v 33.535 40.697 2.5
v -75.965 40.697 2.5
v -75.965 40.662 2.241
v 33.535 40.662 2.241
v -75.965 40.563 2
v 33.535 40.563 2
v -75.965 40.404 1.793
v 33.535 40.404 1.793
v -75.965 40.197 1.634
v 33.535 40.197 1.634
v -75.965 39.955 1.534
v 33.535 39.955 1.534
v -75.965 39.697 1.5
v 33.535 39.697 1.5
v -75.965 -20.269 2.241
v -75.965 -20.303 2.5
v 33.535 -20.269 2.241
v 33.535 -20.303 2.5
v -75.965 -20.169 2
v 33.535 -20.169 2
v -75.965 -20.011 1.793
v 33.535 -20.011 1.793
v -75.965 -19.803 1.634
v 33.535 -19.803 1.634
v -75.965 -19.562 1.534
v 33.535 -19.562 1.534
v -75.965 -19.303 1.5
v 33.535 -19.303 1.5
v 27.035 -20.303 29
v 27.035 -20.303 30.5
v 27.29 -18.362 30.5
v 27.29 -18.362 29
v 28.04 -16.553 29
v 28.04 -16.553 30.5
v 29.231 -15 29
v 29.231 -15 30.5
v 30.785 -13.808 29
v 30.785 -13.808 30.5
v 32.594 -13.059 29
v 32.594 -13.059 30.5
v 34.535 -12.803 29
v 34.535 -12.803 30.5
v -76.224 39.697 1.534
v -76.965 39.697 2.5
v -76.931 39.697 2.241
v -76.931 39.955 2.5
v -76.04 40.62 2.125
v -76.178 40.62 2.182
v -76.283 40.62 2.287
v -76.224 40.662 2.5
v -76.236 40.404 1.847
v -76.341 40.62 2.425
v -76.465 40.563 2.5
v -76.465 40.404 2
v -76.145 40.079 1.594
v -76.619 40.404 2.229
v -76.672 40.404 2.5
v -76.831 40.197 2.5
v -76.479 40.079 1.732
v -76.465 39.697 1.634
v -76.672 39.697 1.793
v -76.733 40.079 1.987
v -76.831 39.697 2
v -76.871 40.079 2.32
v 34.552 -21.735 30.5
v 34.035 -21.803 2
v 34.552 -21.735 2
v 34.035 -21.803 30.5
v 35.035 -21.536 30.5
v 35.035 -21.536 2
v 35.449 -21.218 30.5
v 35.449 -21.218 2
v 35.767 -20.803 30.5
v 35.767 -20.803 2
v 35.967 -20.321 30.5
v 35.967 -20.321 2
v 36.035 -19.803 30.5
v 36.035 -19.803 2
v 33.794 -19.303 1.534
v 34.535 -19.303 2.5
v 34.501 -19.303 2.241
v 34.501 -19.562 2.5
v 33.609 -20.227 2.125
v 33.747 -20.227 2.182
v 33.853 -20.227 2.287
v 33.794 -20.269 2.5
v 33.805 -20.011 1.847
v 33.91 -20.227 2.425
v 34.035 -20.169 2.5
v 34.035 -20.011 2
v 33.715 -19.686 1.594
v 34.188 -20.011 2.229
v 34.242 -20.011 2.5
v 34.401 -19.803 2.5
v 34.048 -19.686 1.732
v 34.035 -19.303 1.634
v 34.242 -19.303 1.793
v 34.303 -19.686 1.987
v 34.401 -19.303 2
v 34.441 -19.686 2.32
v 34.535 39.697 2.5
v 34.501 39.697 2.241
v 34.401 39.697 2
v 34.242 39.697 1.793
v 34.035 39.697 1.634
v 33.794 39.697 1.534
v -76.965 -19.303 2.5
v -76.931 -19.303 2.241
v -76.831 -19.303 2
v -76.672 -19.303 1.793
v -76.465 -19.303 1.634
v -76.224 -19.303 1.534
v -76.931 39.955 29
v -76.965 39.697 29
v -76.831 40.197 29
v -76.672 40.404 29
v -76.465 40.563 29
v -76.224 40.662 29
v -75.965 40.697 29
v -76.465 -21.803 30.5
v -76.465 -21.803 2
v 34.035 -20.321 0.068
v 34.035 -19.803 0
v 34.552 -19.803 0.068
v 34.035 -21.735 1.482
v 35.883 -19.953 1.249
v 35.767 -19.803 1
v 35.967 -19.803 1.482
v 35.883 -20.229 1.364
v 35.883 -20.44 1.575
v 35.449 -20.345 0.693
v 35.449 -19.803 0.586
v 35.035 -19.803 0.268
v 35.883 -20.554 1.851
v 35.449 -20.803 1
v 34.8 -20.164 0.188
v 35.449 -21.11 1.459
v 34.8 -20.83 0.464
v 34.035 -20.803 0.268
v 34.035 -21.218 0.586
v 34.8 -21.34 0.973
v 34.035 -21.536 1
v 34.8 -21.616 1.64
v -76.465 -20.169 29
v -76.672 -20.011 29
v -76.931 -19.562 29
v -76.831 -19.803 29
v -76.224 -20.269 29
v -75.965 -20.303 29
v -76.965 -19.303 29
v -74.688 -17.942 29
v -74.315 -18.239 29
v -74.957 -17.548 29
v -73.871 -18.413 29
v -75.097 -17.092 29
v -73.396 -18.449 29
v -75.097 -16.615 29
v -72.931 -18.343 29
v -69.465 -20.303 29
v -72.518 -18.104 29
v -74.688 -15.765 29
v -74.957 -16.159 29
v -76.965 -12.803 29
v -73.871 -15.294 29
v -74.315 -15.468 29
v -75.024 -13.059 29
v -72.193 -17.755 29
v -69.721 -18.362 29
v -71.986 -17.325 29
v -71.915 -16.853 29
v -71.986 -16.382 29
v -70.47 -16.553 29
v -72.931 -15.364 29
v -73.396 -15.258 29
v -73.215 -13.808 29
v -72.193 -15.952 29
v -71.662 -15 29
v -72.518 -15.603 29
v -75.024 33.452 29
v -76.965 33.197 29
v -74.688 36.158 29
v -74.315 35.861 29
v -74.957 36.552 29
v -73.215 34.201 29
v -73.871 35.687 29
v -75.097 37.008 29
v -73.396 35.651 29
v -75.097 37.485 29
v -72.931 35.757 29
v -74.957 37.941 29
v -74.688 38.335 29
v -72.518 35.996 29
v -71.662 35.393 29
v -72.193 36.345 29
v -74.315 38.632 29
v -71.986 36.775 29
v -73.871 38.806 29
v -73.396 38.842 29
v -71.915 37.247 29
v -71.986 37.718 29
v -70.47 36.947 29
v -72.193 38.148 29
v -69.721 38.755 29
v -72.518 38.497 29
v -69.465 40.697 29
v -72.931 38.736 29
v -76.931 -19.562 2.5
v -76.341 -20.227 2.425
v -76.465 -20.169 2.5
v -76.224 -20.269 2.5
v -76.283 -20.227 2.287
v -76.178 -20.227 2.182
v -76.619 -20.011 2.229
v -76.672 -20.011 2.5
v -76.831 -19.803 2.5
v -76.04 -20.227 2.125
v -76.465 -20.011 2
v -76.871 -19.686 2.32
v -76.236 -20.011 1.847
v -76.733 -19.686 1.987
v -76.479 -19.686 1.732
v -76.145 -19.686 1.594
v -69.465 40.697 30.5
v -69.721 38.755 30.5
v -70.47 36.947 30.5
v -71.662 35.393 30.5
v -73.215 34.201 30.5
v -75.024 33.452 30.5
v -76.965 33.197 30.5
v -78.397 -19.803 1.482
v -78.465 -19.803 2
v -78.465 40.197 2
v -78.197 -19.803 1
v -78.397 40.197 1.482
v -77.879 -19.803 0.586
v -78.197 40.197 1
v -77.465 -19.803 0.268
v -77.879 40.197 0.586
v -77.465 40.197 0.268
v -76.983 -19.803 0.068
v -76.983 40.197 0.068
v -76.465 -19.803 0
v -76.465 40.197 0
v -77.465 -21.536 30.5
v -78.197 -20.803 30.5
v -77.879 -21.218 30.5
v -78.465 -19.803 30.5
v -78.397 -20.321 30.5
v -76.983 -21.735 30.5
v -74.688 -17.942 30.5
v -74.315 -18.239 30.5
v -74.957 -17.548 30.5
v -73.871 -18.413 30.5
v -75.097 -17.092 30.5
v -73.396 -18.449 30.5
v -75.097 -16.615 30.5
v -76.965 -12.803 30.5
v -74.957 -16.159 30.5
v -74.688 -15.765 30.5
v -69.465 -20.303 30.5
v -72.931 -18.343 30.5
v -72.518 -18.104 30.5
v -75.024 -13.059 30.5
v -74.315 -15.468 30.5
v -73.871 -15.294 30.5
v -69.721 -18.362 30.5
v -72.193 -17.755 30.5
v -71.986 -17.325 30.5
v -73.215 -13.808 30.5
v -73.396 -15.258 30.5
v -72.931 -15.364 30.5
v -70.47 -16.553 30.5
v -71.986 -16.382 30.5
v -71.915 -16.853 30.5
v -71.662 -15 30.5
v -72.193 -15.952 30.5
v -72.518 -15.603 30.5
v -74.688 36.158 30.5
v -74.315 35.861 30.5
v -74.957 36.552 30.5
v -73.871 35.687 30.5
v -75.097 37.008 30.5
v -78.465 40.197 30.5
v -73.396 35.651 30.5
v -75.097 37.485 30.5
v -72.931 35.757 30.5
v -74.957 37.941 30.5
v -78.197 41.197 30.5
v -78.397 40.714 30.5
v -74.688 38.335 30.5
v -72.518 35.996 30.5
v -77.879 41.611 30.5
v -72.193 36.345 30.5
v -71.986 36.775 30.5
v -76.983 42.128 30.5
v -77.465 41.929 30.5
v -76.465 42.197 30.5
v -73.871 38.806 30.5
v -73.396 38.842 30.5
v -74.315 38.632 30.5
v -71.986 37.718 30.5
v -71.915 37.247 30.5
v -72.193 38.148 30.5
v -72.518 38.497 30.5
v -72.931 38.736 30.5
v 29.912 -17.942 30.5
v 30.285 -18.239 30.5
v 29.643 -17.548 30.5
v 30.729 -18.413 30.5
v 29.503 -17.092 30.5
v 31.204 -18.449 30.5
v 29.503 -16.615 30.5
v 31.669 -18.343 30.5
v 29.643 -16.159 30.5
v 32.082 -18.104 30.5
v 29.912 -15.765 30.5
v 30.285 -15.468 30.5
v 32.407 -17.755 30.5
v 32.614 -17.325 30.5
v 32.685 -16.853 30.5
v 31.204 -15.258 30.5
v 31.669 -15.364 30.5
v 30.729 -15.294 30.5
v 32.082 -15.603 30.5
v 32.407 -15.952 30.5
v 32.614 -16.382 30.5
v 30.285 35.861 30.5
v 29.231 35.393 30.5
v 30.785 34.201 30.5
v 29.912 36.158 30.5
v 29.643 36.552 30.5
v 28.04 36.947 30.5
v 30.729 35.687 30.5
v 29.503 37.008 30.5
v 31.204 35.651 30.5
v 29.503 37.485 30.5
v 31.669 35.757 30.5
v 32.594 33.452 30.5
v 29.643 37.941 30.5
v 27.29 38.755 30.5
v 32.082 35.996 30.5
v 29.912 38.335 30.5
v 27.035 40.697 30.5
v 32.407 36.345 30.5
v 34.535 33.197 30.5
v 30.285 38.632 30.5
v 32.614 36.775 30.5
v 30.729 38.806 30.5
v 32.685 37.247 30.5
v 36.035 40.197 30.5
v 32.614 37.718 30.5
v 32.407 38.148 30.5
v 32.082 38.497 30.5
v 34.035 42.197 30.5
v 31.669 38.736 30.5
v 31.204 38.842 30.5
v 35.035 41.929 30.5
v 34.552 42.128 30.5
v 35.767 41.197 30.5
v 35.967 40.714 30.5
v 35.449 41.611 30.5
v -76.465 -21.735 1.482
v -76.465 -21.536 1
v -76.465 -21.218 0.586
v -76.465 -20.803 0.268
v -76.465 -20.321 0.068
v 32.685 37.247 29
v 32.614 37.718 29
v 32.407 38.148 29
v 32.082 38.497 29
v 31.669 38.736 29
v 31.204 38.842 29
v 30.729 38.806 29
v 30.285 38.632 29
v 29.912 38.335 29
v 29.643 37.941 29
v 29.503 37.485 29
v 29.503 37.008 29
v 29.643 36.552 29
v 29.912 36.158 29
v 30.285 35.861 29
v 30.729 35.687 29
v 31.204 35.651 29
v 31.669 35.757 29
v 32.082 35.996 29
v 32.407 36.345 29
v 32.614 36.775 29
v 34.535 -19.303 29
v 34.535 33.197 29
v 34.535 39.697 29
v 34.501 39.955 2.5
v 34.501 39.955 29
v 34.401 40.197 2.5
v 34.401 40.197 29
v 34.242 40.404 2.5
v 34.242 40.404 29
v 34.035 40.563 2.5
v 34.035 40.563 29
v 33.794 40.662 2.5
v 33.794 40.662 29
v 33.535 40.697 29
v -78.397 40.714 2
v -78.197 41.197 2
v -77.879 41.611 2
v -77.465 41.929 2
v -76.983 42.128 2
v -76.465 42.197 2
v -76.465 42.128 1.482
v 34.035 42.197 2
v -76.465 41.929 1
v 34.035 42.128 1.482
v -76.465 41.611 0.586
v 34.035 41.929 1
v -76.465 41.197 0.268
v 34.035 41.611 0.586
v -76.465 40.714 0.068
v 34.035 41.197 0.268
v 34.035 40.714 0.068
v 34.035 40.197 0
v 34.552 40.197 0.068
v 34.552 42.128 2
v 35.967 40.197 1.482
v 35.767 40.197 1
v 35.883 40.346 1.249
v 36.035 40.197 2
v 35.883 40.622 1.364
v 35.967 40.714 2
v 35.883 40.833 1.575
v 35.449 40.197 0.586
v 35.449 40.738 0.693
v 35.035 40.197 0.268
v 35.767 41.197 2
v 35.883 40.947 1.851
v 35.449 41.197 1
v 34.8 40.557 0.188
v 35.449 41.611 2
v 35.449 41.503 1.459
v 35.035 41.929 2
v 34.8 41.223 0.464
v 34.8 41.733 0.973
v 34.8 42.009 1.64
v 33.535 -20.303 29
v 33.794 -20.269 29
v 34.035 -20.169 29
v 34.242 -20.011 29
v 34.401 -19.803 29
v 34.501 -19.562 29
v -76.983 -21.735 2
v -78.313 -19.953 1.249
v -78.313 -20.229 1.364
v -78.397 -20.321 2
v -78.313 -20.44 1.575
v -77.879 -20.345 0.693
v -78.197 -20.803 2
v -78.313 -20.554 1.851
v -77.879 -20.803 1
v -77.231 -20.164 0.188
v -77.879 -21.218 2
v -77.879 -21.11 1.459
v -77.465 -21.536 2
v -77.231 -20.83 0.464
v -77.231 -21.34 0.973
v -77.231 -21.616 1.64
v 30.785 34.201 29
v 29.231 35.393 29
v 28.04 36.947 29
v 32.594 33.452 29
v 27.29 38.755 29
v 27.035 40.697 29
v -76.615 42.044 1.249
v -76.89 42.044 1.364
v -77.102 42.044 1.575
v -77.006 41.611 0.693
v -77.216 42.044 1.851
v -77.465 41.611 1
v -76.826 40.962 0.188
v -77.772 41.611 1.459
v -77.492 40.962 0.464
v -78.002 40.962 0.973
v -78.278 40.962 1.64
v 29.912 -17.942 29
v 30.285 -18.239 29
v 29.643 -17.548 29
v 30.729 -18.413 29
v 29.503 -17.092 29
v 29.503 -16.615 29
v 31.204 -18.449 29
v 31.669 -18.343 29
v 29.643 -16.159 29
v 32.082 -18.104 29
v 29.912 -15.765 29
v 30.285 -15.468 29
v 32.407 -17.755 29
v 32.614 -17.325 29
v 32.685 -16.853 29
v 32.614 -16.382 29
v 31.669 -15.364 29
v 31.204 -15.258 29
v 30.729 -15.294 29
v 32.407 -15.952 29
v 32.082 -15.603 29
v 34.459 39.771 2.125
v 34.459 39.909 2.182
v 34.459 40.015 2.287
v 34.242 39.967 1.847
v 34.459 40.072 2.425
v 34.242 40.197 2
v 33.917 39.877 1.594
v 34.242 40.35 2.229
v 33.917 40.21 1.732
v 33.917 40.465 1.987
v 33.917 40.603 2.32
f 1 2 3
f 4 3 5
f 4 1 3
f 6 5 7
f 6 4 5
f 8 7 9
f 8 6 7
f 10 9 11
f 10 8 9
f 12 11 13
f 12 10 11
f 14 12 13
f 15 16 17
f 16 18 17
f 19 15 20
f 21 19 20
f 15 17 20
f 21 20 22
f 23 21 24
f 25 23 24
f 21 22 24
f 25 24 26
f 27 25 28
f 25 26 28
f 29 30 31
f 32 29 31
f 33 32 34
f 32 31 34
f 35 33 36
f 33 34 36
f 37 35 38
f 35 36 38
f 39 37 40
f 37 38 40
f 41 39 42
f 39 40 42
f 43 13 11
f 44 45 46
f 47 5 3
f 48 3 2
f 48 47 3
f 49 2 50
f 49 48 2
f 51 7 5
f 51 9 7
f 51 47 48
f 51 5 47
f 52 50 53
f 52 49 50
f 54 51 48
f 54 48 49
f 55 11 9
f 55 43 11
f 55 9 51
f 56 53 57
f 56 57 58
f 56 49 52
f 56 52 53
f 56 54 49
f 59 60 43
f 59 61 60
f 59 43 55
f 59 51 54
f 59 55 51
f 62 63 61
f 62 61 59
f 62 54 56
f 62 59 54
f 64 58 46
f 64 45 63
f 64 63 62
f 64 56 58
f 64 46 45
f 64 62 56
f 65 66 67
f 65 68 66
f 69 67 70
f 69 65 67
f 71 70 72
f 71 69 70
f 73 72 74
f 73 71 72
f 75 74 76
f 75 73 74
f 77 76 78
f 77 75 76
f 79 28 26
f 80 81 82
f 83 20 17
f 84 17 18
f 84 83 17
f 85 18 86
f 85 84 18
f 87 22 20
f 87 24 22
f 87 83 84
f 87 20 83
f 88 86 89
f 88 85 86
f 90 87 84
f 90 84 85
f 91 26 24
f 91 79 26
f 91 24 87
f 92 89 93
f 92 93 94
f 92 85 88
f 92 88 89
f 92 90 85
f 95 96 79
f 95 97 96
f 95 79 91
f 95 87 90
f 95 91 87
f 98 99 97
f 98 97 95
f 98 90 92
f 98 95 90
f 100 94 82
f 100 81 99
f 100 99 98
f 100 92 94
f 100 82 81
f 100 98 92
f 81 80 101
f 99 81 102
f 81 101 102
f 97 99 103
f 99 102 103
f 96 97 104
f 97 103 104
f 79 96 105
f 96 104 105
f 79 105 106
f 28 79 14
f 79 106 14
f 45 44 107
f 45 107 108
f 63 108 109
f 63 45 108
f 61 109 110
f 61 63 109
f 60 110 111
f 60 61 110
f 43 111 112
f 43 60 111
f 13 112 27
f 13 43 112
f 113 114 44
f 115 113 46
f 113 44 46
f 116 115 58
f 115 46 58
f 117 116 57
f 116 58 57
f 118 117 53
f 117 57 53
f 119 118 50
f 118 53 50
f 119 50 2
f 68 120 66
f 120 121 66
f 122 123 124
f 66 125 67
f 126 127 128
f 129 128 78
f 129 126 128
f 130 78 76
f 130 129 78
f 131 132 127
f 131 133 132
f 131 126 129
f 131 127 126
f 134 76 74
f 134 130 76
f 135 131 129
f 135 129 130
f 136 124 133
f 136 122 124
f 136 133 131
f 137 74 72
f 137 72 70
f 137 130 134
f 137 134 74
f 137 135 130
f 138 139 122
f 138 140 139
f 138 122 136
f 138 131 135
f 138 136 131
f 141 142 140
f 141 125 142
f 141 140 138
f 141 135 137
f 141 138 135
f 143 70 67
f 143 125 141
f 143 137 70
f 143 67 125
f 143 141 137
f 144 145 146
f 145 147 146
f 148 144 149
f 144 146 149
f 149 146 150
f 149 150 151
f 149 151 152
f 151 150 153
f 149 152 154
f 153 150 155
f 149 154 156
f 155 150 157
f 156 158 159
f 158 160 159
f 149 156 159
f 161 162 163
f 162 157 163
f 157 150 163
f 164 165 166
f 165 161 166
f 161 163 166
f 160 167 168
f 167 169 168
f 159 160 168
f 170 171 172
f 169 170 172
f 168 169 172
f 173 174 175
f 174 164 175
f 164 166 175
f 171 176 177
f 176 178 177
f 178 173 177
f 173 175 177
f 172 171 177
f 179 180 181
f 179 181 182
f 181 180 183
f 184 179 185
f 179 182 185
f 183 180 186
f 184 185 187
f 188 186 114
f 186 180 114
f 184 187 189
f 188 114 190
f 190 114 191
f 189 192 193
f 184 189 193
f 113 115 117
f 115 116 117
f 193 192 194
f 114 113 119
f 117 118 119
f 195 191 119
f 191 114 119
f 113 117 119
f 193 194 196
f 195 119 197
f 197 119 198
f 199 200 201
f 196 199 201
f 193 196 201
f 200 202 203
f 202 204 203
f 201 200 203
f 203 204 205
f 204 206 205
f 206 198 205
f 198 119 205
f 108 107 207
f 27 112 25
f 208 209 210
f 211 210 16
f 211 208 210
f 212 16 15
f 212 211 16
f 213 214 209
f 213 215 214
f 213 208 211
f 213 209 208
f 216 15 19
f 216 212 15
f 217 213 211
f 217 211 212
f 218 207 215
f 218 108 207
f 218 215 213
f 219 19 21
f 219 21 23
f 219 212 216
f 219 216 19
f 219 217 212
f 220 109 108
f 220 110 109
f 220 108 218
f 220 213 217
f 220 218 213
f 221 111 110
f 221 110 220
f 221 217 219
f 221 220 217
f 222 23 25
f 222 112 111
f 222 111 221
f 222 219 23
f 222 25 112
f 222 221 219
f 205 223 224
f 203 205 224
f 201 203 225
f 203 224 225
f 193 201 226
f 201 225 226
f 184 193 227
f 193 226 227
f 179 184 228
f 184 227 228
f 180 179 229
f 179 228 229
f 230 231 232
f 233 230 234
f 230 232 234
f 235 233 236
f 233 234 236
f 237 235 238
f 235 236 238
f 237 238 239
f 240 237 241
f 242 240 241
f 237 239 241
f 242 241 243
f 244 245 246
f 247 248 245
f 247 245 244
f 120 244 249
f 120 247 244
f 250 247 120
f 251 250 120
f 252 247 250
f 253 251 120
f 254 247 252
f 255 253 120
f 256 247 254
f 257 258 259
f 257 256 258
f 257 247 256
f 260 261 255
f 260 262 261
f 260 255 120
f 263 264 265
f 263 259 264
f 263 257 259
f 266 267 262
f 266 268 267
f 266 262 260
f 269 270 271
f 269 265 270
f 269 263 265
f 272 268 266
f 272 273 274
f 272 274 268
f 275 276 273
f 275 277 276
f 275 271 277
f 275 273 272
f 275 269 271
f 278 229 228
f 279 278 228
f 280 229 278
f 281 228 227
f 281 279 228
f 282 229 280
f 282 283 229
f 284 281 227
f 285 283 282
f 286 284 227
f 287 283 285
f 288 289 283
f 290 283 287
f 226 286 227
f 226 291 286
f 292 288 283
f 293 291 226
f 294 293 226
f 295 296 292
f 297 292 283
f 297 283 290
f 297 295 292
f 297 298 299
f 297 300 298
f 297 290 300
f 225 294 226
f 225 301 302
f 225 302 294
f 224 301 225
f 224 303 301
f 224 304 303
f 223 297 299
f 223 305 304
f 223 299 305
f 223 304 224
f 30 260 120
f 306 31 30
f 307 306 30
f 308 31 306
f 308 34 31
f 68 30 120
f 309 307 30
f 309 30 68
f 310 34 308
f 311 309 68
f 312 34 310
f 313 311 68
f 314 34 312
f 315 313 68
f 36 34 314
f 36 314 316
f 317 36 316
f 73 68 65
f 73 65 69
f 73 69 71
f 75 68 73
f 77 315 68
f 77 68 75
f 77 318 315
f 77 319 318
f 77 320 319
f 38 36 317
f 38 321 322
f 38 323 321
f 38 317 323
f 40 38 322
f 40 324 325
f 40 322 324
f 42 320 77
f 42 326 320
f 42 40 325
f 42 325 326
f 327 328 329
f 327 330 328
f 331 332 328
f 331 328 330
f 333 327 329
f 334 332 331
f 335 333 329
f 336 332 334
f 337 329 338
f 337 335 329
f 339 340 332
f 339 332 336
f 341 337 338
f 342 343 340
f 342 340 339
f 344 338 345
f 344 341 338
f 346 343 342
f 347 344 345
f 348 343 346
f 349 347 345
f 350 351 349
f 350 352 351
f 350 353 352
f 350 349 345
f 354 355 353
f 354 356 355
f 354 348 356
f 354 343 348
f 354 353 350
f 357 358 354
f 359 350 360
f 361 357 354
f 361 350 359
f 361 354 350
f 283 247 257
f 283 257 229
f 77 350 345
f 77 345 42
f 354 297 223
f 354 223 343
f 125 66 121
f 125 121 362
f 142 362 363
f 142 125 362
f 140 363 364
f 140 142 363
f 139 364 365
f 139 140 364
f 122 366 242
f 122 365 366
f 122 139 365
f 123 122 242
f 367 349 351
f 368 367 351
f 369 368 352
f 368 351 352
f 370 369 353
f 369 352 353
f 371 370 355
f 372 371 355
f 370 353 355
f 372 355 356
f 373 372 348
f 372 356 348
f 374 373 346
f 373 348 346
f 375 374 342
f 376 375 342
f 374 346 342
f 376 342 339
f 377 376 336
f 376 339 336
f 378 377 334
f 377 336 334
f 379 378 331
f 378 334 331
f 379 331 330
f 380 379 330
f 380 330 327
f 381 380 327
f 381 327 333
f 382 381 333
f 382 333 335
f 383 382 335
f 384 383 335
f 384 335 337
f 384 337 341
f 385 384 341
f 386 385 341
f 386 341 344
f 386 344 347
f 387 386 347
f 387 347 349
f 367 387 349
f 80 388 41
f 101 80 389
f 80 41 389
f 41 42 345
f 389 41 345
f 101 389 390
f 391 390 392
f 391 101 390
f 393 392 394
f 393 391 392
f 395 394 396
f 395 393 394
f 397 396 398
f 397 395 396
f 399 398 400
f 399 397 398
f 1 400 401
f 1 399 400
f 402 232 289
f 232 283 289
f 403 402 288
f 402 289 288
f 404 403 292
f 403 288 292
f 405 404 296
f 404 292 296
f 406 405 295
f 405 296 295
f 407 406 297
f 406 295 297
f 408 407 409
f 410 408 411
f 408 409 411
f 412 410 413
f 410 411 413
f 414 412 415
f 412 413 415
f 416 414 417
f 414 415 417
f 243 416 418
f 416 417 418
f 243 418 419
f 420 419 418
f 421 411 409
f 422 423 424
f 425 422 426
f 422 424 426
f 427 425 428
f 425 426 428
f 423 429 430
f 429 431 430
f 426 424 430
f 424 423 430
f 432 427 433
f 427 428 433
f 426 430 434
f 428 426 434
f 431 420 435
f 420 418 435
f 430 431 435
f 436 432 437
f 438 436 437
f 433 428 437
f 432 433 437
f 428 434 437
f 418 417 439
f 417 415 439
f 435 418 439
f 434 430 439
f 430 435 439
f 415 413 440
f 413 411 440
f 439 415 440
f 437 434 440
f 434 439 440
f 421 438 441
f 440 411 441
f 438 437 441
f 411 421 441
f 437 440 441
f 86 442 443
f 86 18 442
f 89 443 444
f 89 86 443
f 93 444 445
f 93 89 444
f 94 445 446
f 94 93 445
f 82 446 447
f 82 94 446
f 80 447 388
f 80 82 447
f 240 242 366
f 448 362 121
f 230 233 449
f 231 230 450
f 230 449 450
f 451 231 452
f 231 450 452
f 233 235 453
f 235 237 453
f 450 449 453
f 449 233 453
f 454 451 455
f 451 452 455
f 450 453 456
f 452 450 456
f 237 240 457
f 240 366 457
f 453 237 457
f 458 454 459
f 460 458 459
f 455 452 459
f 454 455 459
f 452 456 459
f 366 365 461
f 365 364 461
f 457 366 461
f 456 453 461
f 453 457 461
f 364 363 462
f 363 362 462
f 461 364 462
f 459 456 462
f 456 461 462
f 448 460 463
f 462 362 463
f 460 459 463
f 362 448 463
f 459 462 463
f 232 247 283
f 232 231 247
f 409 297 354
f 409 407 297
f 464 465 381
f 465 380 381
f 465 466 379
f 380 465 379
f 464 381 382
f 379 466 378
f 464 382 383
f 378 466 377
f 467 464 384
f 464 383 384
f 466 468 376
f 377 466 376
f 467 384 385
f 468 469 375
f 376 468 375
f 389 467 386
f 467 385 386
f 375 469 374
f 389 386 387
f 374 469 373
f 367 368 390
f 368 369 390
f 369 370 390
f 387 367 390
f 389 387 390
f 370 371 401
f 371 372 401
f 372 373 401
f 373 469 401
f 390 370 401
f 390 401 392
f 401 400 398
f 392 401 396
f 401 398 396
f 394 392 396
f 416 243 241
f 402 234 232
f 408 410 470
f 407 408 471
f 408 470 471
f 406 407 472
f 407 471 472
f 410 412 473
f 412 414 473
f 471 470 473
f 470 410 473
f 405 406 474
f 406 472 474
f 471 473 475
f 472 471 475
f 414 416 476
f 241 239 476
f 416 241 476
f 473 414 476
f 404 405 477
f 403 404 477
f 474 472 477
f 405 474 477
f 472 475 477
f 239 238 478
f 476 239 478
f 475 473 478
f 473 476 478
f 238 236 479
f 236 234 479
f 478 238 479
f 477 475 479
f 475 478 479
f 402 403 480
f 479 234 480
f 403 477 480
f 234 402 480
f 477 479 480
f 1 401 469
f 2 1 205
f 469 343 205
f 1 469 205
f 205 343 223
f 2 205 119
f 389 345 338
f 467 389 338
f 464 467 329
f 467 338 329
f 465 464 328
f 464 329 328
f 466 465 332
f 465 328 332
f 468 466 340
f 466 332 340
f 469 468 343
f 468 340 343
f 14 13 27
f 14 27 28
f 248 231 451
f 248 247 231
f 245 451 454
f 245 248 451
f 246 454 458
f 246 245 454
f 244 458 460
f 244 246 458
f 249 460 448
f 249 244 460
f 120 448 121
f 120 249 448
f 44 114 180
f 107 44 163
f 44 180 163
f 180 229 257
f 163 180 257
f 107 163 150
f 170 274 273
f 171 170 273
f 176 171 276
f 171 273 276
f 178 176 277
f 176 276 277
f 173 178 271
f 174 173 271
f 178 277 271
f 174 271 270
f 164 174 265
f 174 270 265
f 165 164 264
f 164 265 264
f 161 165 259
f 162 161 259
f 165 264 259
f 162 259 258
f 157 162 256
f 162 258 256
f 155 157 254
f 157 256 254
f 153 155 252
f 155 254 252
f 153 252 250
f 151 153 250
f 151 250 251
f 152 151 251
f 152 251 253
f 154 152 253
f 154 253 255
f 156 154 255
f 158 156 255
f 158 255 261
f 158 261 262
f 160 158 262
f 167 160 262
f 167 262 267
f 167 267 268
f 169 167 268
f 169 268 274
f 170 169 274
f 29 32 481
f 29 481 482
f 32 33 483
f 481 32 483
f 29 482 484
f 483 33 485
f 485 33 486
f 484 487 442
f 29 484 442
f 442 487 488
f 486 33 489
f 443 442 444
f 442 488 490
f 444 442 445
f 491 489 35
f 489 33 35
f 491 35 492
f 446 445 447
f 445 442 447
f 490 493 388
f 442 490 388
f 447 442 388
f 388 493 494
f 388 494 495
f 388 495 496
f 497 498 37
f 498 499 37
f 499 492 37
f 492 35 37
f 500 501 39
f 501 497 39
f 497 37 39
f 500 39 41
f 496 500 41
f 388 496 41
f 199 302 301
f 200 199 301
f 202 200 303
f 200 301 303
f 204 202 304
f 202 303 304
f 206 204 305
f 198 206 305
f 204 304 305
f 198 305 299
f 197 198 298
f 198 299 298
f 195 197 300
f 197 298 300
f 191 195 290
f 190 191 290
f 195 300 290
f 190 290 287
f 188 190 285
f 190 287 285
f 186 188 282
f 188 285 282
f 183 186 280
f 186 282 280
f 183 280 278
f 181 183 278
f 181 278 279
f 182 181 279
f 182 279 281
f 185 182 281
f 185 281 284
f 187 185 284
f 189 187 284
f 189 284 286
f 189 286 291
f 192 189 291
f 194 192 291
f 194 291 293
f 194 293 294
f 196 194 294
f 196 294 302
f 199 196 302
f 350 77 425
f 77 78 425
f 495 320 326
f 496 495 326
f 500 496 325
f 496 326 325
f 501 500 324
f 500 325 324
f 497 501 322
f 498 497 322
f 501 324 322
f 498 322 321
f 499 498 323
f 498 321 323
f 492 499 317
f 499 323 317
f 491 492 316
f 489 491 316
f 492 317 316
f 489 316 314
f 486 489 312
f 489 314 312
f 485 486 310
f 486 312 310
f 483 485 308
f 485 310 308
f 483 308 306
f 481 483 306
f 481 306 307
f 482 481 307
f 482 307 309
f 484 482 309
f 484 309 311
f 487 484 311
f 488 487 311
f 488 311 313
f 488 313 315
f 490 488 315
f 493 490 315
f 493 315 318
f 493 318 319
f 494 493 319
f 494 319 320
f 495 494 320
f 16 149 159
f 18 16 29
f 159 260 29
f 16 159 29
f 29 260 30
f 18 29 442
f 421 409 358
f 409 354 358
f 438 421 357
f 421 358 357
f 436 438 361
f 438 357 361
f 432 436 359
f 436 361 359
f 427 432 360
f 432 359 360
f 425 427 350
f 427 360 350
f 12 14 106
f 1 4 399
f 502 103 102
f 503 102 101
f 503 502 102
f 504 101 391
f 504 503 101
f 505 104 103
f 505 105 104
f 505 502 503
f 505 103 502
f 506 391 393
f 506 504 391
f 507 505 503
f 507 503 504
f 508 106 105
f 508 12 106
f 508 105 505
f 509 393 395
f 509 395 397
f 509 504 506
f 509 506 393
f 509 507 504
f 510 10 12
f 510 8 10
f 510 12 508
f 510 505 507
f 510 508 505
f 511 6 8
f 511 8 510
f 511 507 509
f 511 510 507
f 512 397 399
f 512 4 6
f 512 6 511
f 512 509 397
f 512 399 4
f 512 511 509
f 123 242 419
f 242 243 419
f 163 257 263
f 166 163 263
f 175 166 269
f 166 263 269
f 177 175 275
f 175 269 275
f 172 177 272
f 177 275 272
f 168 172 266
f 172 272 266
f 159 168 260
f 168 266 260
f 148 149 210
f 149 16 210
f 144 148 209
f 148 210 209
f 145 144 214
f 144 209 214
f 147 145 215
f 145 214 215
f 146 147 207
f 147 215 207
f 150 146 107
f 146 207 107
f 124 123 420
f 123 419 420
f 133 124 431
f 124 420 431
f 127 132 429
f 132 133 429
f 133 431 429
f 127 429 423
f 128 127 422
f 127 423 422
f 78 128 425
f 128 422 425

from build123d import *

# Parameters (mm, degrees)
ESQUISSE1_W             = 114.5
ESQUISSE1_H             = 64
BOSS_EXTRU_1_DEPTH      = 30.5
ENL_V_MAT_EXTRU_2_DEPTH = 1.5
ESQUISSE3_W             = 111.5
ESQUISSE3_H             = 61
ENL_V_MAT_EXTRU_3_DEPTH = 27.5
ENL_V_MAT_EXTRU_4_REACH = 96.168
ESQUISSE2_4_R           = 1.6
CONG_1_R                = 2
CONG_2_R                = 1


with BuildPart() as part:
    # Esquisse1 → Boss.-Extru.1 (new body)
    with BuildSketch(Plane.XY):
        with Locations((-21.215258856, 10.196525886)):
            Rectangle(ESQUISSE1_W, ESQUISSE1_H)
    extrude(amount=BOSS_EXTRU_1_DEPTH)

    # Esquisse2 → Enlèv. mat.-Extru.2 (cut)
    with BuildSketch(Plane.XY.offset(30.5)):
        with BuildLine():
            ThreePointArc((27.034741144, -20.303474114), (29.231440286, -15.000173256), (34.534741144, -12.803474114))
            Line((34.534741144, -12.803474114), (34.534741144, 33.196525886))
            ThreePointArc((34.534741144, 33.196525886), (29.231440286, 35.393225027), (27.034741144, 40.696525886))
            Line((27.034741144, 40.696525886), (-69.465258856, 40.696525886))
            ThreePointArc((-69.465258856, 40.696525886), (-71.661957997, 35.393225027), (-76.965258856, 33.196525886))
            Line((-76.965258856, 33.196525886), (-76.965258856, -12.803474114))
            ThreePointArc((-76.965258856, -12.803474114), (-71.661957997, -15.000173256), (-69.465258856, -20.303474114))
            Line((-69.465258856, -20.303474114), (27.034741144, -20.303474114))
        make_face()
    extrude(amount=-ENL_V_MAT_EXTRU_2_DEPTH, mode=Mode.SUBTRACT)

    # Esquisse3 → Enlèv. mat.-Extru.3 (cut)
    with BuildSketch(Plane.XY.offset(29)):
        with Locations((-21.215258856, 10.196525886)):
            Rectangle(ESQUISSE3_W, ESQUISSE3_H)
    extrude(amount=-ENL_V_MAT_EXTRU_3_DEPTH, mode=Mode.SUBTRACT)

    # Esquisse2<4> → Enlèv. mat.-Extru.4 (cut, up to next)
    with BuildSketch(Plane.XY.offset(30.5), mode=Mode.PRIVATE) as enl_v_mat_extru_4_sk1:
        with Locations((-73.515258856, 37.246525886)):
            Circle(ESQUISSE2_4_R)
    enl_v_mat_extru_4_tool1 = extrude(enl_v_mat_extru_4_sk1.sketch, amount=-ENL_V_MAT_EXTRU_4_REACH, mode=Mode.PRIVATE) & part.part
    # Esquisse2<4> → Enlèv. mat.-Extru.4 (cut, up to next)
    with BuildSketch(Plane.XY.offset(30.5), mode=Mode.PRIVATE) as enl_v_mat_extru_4_sk2:
        with Locations((31.084741144, 37.246525886)):
            Circle(ESQUISSE2_4_R)
    enl_v_mat_extru_4_tool2 = extrude(enl_v_mat_extru_4_sk2.sketch, amount=-ENL_V_MAT_EXTRU_4_REACH, mode=Mode.PRIVATE) & part.part
    # Esquisse2<4> → Enlèv. mat.-Extru.4 (cut, up to next)
    with BuildSketch(Plane.XY.offset(30.5), mode=Mode.PRIVATE) as enl_v_mat_extru_4_sk3:
        with Locations((-73.515258856, -16.853474114)):
            Circle(ESQUISSE2_4_R)
    enl_v_mat_extru_4_tool3 = extrude(enl_v_mat_extru_4_sk3.sketch, amount=-ENL_V_MAT_EXTRU_4_REACH, mode=Mode.PRIVATE) & part.part
    # Esquisse2<4> → Enlèv. mat.-Extru.4 (cut, up to next)
    with BuildSketch(Plane.XY.offset(30.5), mode=Mode.PRIVATE) as enl_v_mat_extru_4_sk4:
        with Locations((31.084741144, -16.853474114)):
            Circle(ESQUISSE2_4_R)
    enl_v_mat_extru_4_tool4 = extrude(enl_v_mat_extru_4_sk4.sketch, amount=-ENL_V_MAT_EXTRU_4_REACH, mode=Mode.PRIVATE) & part.part
    add(enl_v_mat_extru_4_tool1.solids().sort_by_distance((-73.515259, 37.246526, 30.5))[0], mode=Mode.SUBTRACT)
    add(enl_v_mat_extru_4_tool2.solids().sort_by_distance((31.084741, 37.246526, 30.5))[0], mode=Mode.SUBTRACT)
    add(enl_v_mat_extru_4_tool3.solids().sort_by_distance((-73.515259, -16.853474, 30.5))[0], mode=Mode.SUBTRACT)
    add(enl_v_mat_extru_4_tool4.solids().sort_by_distance((31.084741, -16.853474, 30.5))[0], mode=Mode.SUBTRACT)

    # Congé1
    cong_1_edges = [part.edges().sort_by_distance(p)[0] for p in [
        (-78.465258856, 10.196525886, 0),
        (-21.215258856, -21.803474114, 0),
        (-21.215258856, 42.196525886, 0),
        (36.034741144, 10.196525886, 0),
        (-78.465258856, -21.803474114, 15.25),
        (-78.465258856, 42.196525886, 15.25),
        (36.034741144, 42.196525886, 15.25),
        (36.034741144, -21.803474114, 15.25),
    ]]
    fillet(cong_1_edges, radius=CONG_1_R)

    # Congé2
    cong_2_edges = [part.edges().sort_by_distance(p)[0] for p in [
        (-21.215258856, 40.696525886, 1.5),
        (34.534741144, 10.196525886, 1.5),
        (-21.215258856, -20.303474114, 1.5),
        (-76.965258856, 10.196525886, 1.5),
        (-76.965258856, 40.696525886, 15.25),
        (34.534741144, 40.696525886, 15.25),
        (34.534741144, -20.303474114, 15.25),
        (-76.965258856, -20.303474114, 15.25),
    ]]
    fillet(cong_2_edges, radius=CONG_2_R)


solid = part.part
